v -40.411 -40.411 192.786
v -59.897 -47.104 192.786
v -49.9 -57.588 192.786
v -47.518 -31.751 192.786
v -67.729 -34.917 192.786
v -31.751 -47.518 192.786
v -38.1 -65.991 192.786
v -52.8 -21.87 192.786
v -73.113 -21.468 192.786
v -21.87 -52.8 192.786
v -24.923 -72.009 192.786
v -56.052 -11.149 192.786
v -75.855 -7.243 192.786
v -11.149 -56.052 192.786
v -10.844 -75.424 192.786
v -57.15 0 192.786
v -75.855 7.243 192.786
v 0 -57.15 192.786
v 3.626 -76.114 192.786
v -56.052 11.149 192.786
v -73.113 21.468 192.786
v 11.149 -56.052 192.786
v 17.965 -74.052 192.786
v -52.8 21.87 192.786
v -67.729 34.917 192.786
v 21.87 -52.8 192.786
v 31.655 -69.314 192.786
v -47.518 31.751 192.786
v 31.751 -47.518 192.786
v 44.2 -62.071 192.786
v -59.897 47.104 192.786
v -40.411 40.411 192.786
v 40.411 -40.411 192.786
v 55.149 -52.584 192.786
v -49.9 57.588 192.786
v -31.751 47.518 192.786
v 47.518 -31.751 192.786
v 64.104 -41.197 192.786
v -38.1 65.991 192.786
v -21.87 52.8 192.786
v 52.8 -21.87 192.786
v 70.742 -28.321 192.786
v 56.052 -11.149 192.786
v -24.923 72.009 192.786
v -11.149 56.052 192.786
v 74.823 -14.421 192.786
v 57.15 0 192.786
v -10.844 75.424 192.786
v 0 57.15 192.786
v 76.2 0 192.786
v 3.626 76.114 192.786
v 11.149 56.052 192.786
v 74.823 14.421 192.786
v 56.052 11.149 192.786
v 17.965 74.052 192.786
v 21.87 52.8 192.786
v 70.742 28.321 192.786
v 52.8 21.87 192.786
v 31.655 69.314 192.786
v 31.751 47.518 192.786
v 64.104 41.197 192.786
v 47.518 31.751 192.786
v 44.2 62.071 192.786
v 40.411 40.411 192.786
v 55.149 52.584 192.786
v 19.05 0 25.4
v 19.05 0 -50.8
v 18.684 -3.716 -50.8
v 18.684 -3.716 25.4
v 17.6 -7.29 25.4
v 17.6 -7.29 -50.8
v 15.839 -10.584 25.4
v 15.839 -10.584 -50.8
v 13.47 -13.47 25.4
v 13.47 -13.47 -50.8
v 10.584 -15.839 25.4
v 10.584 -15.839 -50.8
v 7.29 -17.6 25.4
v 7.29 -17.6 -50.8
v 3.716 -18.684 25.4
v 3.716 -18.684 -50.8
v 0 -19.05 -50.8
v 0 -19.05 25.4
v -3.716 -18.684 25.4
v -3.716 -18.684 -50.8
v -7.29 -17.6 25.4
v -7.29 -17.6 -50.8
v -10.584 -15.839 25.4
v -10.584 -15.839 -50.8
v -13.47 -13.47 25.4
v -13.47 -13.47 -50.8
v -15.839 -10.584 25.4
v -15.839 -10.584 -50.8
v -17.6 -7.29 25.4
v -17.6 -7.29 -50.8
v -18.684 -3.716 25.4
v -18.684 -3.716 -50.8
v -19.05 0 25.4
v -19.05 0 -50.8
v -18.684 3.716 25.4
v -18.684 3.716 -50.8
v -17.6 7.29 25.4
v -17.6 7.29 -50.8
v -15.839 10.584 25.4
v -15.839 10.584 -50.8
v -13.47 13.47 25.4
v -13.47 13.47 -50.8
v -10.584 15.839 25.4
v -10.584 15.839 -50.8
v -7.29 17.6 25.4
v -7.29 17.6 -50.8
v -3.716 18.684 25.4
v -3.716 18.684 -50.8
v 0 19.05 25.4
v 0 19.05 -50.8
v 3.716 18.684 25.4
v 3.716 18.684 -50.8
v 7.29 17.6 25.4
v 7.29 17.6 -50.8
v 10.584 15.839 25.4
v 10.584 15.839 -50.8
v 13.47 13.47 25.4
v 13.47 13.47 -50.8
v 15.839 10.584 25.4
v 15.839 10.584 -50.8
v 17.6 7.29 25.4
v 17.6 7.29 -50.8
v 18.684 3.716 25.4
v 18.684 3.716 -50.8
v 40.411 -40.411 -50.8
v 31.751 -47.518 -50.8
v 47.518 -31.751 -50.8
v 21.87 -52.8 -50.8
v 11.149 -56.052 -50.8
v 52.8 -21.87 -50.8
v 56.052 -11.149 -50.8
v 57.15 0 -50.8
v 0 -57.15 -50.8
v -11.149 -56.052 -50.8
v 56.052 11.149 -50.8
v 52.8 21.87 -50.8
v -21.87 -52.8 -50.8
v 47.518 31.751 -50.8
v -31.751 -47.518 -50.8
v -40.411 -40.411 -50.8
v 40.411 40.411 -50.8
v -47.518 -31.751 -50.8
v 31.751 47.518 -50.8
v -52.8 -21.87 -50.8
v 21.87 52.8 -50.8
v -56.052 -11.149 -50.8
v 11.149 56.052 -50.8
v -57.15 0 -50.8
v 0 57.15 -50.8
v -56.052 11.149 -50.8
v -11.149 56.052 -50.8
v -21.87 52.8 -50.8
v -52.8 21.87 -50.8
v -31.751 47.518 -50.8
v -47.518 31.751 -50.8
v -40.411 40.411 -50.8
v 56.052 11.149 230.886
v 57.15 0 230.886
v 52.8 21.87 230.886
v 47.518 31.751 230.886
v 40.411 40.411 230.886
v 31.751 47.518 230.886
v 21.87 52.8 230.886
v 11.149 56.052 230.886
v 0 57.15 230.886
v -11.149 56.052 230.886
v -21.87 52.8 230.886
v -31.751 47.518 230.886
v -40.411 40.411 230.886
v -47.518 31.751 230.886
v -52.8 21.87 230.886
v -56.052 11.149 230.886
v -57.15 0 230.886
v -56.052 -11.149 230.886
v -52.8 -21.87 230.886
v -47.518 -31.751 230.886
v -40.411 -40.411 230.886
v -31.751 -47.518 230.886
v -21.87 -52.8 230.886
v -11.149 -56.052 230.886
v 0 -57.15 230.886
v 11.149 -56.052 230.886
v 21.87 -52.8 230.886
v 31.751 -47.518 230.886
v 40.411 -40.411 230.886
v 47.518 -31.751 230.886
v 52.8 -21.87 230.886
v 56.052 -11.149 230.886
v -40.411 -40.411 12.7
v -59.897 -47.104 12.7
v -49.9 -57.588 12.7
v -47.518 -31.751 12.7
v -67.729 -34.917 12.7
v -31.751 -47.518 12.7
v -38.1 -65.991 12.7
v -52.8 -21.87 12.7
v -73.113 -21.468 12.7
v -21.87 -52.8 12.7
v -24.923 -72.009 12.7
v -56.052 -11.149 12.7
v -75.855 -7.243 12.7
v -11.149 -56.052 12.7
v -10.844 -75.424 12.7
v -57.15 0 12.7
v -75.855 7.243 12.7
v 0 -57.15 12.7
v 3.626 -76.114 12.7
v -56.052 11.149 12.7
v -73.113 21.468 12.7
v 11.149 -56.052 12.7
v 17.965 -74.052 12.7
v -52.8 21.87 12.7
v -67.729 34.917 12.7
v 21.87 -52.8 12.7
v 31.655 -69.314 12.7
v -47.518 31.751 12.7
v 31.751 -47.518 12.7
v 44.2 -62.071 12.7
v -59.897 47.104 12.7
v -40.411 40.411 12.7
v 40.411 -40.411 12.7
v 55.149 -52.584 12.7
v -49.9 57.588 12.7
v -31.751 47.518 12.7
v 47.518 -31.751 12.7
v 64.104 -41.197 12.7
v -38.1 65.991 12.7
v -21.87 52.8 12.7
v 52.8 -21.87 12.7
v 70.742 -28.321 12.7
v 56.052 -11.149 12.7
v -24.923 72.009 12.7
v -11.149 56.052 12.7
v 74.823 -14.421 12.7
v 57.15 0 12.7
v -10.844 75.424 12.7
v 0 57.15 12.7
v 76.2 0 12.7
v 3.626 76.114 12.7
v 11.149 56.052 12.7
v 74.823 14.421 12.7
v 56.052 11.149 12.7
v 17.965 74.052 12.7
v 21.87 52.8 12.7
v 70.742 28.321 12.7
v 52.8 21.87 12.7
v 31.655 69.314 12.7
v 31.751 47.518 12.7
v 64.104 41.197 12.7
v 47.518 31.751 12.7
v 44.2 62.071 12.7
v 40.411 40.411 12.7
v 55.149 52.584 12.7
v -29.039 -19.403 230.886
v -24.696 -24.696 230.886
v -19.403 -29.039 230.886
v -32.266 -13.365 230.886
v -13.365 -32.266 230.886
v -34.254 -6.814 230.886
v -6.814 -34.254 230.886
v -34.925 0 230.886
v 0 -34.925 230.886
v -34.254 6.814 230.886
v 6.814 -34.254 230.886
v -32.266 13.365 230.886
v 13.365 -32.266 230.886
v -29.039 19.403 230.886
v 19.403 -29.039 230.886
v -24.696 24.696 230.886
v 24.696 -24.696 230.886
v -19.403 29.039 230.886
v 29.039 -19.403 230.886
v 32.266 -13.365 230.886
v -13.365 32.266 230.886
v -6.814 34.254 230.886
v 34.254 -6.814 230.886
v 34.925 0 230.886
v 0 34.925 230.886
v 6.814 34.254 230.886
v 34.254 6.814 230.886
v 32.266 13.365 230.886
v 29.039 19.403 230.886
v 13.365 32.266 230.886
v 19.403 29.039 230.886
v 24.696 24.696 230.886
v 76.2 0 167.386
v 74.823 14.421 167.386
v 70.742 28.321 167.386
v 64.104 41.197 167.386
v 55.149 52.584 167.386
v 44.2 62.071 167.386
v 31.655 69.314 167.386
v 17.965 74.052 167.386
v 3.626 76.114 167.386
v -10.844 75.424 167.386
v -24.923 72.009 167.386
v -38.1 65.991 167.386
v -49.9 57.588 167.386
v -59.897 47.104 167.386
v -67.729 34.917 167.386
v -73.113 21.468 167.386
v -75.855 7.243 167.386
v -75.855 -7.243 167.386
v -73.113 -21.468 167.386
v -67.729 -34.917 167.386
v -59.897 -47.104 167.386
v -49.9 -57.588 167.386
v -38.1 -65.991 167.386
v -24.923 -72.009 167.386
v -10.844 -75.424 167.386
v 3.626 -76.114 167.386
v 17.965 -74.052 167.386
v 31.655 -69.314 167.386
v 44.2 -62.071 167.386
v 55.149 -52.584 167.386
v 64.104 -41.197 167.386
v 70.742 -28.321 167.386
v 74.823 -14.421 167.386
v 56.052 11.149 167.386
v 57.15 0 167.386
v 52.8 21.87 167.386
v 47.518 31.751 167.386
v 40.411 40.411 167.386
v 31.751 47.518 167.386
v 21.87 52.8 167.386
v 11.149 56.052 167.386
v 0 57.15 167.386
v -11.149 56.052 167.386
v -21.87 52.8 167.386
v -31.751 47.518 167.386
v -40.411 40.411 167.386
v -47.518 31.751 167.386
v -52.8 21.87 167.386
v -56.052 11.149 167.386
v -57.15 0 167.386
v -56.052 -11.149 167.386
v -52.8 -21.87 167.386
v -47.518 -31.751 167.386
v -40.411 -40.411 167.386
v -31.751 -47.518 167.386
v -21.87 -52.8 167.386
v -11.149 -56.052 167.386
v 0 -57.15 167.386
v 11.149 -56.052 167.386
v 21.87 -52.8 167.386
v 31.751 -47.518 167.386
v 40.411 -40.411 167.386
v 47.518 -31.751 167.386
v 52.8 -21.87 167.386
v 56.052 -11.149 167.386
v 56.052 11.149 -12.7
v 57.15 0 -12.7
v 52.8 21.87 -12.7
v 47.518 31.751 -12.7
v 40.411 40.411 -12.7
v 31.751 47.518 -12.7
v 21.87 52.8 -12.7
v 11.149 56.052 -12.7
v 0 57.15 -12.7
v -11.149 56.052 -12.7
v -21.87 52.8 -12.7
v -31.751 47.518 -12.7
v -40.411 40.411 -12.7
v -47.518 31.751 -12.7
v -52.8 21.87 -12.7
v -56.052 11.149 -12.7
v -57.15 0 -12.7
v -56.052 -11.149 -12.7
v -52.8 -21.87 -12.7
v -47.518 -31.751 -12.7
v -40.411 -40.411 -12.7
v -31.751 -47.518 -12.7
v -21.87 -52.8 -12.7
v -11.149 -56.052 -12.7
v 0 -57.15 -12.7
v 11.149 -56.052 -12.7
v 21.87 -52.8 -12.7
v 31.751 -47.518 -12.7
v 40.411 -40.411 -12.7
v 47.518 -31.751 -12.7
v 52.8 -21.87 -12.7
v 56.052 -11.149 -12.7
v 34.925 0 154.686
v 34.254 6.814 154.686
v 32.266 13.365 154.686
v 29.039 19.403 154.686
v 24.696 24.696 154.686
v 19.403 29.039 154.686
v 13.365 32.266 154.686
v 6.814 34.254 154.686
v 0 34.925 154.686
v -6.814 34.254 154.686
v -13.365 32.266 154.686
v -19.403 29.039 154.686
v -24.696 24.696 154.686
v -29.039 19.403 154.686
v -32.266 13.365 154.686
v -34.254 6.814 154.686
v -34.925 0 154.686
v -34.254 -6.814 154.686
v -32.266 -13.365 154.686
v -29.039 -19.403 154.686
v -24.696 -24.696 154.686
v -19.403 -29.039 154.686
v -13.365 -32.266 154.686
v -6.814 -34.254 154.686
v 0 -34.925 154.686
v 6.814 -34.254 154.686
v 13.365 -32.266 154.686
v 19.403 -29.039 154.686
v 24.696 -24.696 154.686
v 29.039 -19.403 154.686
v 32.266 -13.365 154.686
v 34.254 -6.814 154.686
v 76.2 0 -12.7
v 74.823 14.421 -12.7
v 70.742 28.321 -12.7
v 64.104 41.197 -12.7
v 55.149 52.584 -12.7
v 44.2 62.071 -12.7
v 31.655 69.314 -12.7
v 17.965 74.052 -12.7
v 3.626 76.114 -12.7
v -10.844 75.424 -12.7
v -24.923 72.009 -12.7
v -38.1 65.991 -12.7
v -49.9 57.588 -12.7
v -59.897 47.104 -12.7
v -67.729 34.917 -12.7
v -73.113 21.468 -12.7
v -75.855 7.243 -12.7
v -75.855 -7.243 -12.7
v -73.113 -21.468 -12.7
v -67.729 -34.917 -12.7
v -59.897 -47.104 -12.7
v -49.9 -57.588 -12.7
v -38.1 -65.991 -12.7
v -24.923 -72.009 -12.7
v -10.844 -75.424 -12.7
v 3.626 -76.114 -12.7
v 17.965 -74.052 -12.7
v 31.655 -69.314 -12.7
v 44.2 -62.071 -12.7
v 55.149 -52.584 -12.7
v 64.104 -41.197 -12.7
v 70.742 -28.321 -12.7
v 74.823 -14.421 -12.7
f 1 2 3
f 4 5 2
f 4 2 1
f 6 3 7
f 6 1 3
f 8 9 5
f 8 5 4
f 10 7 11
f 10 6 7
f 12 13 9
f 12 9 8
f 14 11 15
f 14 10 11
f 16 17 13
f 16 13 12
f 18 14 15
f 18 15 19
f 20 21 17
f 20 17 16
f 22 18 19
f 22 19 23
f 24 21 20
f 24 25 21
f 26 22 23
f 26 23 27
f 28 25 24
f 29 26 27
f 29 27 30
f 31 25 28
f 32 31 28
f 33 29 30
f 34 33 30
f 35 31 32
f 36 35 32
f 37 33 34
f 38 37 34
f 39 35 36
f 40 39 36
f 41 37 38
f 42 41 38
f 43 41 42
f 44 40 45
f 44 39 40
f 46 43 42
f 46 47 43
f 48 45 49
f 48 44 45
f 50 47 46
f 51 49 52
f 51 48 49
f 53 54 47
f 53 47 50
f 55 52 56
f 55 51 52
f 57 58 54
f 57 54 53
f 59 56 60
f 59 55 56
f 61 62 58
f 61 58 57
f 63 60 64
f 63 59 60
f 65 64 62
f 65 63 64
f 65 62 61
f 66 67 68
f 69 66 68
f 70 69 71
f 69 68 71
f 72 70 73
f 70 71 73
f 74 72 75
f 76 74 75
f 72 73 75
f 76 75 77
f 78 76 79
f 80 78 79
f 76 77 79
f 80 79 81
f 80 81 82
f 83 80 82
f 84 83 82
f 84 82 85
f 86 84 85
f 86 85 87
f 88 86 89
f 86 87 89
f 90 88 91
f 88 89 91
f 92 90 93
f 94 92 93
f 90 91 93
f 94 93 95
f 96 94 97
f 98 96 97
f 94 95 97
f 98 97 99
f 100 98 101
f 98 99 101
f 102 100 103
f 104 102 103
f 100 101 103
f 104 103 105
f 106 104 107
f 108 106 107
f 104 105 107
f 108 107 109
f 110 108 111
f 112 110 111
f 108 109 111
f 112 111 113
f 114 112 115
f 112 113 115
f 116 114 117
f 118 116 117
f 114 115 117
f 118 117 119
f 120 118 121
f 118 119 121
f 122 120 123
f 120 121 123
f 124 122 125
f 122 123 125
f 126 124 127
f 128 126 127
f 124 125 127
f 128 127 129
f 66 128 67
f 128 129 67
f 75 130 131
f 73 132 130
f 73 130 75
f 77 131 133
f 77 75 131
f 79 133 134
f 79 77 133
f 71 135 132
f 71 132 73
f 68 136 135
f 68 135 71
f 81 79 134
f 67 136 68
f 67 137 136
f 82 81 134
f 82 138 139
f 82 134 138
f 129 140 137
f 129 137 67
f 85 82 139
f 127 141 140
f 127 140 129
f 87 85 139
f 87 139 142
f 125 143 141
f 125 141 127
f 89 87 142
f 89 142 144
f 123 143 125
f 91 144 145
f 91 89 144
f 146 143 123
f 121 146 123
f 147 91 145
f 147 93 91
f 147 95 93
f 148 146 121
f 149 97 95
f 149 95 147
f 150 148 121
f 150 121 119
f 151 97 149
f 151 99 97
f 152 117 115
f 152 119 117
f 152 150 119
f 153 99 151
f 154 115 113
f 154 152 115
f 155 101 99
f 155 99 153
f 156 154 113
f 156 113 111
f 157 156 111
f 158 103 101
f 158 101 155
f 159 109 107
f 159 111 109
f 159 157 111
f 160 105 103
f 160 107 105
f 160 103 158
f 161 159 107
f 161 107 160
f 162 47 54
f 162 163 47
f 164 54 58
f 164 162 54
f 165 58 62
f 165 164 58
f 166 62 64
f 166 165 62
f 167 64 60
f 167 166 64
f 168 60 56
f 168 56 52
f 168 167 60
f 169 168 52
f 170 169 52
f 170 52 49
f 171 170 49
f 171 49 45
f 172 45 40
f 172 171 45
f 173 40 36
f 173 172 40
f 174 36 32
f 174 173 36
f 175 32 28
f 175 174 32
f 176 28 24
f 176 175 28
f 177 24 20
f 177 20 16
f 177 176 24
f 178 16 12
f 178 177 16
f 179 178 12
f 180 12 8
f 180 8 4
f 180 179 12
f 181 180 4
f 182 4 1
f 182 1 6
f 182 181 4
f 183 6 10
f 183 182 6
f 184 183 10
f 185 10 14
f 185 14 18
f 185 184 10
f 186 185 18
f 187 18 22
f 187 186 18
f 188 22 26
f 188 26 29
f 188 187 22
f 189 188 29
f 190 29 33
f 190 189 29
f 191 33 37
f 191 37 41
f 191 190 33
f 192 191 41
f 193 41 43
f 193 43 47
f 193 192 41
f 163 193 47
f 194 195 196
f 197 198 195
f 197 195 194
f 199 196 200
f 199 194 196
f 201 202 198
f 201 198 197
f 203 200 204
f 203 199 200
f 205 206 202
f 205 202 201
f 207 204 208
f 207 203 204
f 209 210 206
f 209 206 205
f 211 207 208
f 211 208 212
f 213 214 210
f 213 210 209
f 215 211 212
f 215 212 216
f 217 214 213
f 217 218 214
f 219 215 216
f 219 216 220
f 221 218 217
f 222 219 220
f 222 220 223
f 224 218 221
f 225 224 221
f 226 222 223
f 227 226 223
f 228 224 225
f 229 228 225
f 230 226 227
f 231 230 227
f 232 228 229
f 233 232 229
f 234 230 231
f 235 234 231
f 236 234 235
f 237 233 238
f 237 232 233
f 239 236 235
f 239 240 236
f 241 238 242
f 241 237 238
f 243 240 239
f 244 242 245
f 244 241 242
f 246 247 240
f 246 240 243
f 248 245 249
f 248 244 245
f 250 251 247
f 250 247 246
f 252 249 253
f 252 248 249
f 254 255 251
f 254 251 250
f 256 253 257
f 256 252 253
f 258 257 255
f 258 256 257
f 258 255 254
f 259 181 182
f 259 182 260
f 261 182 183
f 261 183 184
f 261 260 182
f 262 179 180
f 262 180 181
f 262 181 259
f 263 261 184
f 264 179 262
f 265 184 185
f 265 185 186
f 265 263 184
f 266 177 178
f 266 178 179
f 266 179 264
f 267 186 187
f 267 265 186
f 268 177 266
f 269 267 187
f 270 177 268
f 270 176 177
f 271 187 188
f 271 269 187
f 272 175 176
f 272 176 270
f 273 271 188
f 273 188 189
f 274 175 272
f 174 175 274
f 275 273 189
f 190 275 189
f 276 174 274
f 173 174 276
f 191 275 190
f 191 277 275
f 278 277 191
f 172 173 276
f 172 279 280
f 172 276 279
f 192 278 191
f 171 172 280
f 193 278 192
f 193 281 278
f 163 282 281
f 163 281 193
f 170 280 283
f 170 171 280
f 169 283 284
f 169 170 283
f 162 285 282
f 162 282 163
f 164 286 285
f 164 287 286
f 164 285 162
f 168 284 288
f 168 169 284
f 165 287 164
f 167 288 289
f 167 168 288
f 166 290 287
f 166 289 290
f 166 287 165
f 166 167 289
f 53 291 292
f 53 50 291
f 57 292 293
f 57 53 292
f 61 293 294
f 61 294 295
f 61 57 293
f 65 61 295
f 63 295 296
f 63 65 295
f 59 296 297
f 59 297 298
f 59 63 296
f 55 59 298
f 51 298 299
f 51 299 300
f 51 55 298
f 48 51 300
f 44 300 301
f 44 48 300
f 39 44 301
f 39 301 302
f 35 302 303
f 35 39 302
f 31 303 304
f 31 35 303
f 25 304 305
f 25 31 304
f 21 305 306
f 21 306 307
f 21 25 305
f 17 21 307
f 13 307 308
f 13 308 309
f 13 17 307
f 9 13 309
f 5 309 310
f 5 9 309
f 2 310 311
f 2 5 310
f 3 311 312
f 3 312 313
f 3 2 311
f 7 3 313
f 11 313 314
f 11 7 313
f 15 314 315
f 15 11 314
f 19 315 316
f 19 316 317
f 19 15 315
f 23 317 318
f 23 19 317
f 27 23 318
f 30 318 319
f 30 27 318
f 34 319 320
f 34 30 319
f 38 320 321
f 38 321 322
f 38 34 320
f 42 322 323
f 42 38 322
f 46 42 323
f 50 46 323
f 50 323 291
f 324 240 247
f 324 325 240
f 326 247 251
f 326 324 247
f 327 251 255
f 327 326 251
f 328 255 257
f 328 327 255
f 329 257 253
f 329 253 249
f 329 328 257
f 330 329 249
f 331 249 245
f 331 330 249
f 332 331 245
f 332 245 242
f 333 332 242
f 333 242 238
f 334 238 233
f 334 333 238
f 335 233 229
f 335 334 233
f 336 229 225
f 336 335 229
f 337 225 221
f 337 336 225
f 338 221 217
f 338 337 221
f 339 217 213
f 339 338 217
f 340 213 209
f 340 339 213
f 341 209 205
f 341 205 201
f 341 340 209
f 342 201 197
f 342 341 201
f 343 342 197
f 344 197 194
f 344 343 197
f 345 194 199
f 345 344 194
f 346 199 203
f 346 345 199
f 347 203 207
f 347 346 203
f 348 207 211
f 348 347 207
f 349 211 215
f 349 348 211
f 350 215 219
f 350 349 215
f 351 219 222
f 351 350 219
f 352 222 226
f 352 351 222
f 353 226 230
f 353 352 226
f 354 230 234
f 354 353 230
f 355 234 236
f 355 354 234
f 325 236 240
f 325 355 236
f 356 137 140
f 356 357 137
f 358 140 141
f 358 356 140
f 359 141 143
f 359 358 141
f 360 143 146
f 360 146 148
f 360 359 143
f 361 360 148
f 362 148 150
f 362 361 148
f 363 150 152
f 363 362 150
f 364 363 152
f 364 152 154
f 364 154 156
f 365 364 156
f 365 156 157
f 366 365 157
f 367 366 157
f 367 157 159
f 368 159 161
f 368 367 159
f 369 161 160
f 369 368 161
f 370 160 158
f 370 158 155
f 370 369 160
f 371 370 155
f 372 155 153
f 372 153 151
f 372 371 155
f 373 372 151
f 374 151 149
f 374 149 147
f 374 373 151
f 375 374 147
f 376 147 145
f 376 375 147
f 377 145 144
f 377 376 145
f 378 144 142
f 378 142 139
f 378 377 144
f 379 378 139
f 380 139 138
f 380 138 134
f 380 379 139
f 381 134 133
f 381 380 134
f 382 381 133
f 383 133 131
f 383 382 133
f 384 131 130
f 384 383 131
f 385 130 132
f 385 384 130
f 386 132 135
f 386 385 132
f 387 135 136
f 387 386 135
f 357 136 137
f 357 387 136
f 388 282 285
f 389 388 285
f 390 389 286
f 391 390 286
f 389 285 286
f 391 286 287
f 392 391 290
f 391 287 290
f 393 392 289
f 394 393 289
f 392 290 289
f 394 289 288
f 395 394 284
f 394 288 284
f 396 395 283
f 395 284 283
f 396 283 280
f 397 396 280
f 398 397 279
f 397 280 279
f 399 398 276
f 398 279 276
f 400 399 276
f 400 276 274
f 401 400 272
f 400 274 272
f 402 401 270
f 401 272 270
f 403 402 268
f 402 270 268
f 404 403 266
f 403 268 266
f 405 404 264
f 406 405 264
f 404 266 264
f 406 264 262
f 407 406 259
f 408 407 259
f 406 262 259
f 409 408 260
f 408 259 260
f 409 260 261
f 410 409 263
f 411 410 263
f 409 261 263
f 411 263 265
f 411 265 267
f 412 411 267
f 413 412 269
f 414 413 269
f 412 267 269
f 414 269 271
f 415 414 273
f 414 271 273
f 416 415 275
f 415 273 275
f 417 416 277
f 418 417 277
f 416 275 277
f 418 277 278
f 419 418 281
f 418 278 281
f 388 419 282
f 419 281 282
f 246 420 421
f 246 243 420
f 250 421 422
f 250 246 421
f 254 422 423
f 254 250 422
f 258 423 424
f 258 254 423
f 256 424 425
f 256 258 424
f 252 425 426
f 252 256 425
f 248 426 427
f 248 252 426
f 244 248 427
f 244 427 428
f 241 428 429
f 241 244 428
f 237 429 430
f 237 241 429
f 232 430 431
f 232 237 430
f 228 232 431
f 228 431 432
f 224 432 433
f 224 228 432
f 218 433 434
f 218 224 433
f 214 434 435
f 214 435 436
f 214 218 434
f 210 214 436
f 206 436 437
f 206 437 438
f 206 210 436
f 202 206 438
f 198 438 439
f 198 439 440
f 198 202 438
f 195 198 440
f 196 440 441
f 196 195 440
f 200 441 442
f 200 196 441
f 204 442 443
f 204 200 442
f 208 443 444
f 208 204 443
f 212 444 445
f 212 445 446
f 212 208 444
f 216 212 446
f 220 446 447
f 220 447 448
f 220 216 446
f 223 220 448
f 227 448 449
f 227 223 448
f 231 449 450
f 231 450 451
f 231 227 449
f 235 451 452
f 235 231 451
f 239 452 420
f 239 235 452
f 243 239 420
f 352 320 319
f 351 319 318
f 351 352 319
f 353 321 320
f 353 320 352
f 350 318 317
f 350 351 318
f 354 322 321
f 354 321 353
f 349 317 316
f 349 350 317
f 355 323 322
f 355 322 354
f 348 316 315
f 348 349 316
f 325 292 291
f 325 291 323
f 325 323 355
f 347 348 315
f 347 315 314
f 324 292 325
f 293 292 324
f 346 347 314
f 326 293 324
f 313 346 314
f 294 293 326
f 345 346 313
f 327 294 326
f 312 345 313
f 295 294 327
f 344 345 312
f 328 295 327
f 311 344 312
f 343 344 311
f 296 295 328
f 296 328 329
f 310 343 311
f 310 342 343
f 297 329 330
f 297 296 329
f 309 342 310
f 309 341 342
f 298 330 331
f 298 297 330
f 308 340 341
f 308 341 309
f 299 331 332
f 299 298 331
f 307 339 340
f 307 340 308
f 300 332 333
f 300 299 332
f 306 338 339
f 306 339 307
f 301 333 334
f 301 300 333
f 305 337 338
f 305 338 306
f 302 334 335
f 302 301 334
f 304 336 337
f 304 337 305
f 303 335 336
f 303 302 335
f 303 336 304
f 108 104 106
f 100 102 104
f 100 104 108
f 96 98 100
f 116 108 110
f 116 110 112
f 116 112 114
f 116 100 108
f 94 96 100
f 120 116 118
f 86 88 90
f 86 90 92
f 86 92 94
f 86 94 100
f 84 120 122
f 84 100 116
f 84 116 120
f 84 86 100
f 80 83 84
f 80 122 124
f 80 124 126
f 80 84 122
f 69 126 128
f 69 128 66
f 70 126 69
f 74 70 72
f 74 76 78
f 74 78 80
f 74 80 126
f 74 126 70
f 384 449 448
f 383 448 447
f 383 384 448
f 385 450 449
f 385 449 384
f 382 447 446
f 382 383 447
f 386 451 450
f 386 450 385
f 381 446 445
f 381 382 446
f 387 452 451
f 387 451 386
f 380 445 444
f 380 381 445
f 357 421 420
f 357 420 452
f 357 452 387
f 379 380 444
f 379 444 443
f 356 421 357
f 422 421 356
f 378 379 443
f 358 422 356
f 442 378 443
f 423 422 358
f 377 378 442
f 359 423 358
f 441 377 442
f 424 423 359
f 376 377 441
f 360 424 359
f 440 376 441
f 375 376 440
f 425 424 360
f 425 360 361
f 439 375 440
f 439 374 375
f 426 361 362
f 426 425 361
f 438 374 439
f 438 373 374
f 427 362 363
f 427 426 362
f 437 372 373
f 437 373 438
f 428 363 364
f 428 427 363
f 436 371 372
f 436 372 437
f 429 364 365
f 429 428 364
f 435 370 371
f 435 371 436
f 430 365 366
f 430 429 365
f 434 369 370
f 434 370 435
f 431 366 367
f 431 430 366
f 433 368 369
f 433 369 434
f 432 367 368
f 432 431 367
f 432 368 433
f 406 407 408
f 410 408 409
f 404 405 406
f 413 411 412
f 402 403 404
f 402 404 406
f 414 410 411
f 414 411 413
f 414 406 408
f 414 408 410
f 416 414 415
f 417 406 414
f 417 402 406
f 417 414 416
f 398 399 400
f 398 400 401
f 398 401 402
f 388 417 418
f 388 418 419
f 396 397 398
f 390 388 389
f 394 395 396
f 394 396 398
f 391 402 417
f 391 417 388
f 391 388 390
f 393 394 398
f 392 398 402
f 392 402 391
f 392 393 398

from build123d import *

# Parameters (mm, degrees)
F2_R     = 19.05
F3_DEPTH = 76.2
F4_R     = 34.925
F5_DEPTH = 76.2


with BuildPart() as f1:
    # F0 (on Front) → F1 (revolve)
    with BuildSketch(Plane.XZ):
        Polygon((0, 180.086), (0, 0), (76.2, 0), (76.2, 12.7), (57.15, 12.7), (57.15, 167.386), (76.2, 167.386), (76.2, 180.086), align=None)
        Polygon((76.2, 0), (0, 0), (0, -50.8), (57.15, -50.8), (57.15, -12.7), (76.2, -12.7), align=None)
        Polygon((0, 230.886), (0, 180.086), (76.2, 180.086), (76.2, 192.786), (57.15, 192.786), (57.15, 230.886), align=None)
    revolve(axis=Axis((0, 0, 90.043), (0, 0, 1)))

    # F2 (on face) → F3 (cut)
    with BuildSketch(Plane(origin=(0, 0, -50.8), x_dir=(1, 0, 0), z_dir=(0, 0, -1))):
        Circle(F2_R)
    extrude(amount=-F3_DEPTH, mode=Mode.SUBTRACT)

    # F4 (on face) → F5 (cut)
    with BuildSketch(Plane.XY.offset(230.886)):
        Circle(F4_R)
    extrude(amount=-F5_DEPTH, mode=Mode.SUBTRACT)


solid = f1.part
